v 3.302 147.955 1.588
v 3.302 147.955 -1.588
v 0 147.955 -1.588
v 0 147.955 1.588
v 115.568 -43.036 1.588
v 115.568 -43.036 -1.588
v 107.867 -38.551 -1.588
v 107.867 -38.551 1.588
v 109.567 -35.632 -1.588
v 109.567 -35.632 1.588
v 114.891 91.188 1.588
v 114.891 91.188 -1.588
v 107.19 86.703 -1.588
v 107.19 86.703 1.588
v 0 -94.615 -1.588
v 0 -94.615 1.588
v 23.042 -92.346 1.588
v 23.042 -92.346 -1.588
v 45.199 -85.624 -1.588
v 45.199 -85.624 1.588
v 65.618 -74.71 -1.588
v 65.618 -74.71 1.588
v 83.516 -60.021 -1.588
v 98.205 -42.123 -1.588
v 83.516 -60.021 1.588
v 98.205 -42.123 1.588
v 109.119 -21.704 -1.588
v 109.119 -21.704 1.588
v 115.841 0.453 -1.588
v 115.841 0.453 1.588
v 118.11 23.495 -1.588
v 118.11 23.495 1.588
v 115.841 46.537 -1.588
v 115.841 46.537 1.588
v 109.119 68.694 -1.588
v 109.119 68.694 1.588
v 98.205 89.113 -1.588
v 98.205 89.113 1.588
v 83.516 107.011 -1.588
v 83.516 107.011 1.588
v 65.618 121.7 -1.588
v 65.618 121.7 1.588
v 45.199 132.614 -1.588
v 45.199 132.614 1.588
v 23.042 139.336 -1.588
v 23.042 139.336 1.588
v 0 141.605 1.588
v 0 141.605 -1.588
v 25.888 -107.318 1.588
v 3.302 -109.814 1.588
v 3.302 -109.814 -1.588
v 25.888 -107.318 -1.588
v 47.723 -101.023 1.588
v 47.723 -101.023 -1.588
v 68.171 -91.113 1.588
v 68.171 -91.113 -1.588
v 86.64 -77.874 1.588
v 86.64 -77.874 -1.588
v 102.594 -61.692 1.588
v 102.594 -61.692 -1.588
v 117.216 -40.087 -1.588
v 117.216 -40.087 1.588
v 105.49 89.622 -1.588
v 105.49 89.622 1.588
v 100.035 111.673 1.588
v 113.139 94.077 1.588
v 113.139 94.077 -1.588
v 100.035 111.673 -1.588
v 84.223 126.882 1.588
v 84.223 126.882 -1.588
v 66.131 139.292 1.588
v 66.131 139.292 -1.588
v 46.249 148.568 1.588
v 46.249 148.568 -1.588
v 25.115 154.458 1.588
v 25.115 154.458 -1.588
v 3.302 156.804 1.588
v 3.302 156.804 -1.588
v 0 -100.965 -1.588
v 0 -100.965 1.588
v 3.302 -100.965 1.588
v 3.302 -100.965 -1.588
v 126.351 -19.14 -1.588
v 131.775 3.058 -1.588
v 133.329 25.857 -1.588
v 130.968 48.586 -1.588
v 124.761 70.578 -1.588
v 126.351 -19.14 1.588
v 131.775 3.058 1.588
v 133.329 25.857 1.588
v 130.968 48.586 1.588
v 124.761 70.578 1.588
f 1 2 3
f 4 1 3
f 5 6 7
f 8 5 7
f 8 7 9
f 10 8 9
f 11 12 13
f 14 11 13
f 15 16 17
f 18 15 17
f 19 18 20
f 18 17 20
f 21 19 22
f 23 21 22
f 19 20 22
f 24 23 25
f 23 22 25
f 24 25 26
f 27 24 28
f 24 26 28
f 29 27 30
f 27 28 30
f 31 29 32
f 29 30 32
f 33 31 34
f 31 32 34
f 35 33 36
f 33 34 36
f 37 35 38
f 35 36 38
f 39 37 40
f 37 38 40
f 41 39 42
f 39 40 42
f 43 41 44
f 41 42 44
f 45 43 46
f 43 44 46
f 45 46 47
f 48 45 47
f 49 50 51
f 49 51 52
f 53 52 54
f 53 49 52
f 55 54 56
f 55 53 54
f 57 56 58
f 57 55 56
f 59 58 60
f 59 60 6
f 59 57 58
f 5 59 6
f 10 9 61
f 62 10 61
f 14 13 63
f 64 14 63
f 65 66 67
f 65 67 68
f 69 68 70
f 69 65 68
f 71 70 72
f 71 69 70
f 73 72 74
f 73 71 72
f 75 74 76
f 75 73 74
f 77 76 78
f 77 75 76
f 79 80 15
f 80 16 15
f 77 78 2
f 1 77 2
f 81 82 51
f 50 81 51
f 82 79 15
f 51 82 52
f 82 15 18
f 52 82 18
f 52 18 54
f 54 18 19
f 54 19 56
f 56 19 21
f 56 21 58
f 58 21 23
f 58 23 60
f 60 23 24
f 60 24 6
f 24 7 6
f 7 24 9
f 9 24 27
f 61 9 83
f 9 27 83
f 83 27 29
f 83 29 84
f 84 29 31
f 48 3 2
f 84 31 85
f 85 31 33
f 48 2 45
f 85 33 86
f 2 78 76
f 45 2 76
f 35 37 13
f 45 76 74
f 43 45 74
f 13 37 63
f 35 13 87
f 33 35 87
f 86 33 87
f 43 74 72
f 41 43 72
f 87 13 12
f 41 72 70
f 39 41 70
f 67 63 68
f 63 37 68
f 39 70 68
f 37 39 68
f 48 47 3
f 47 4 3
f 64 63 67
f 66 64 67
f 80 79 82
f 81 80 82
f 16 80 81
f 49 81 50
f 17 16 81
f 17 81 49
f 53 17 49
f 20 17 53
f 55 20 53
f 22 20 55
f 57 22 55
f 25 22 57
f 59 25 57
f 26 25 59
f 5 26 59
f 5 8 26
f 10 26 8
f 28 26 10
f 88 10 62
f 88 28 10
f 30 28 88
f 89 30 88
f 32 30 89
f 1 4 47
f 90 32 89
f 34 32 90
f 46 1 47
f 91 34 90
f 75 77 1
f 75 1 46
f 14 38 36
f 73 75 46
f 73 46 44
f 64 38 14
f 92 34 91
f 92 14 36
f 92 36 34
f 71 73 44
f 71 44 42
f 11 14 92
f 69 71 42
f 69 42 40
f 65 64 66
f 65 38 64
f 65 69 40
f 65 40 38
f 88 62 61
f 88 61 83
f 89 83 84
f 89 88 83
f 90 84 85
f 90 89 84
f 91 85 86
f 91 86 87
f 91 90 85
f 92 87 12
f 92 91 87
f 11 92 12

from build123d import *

# Parameters (mm, degrees)
BOSS_EXTRUDE1_DEPTH = 1.5875
CUT_EXTRUDE1_DEPTH  = 3.175
FILLET1_R           = 8.89
SKETCH3_W           = 234.443386257
SKETCH3_H           = 422.563019086
CUT_EXTRUDE2_DEPTH  = 134.35
CUT_EXTRUDE3_DEPTH  = 4.175


with BuildPart() as part:
    # Sketch1 → Boss-Extrude1 (new body, symmetric)
    with BuildSketch(Plane.XY):
        with BuildLine():
            Line((-120.187952283, -34.272453), (-93.24718392, -61.213221363))
            Line((-93.24718392, -61.213221363), (-94.292689271, -70.797689271))
            ThreePointArc((-94.292689271, -70.797689271), (-77.124658044, -85.289234251), (-57.767453, -96.692952283))
            ThreePointArc((-57.767453, -96.692952283), (94.292689271, 117.787689271), (-120.187952283, -34.272453))
        make_face()
    extrude(amount=BOSS_EXTRUDE1_DEPTH, both=True)

    # Sketch2 → Cut-Extrude1 (cut)
    with BuildSketch(Plane.XY.offset(1.5875)):
        with BuildLine():
            Line((-77.304798152, -55.60299244), (-78.320318415, -64.912577861))
            ThreePointArc((-78.320318415, -64.912577861), (94.997930523, 93.675946819), (-107.51910025, -25.388690342))
            Line((-107.51910025, -25.388690342), (-77.304798152, -55.60299244))
        make_face()
    extrude(amount=-CUT_EXTRUDE1_DEPTH, mode=Mode.SUBTRACT)

    # Fillet1
    fillet1_edges = [part.edges().sort_by_distance(p)[0] for p in [
        (-77.304798152, -55.60299244, 0),
        (-107.51910025, -25.388690342, 0),
        (-78.320318415, -64.912577861, 0),
        (-93.24718392, -61.213221363, -0.79375),
        (-120.187952283, -34.272453, -0.79375),
        (-94.292689271, -70.797689271, -0.79375),
    ]]
    fillet(fillet1_edges, radius=FILLET1_R)

    # Sketch3 → Cut-Extrude2 (cut, through all)
    with BuildSketch(Plane(origin=(0, 0, 0), x_dir=(0, 0, -1), z_dir=(1, 0, 0))):
        with Locations((10.168628802, 16.433452221)):
            Rectangle(SKETCH3_W, SKETCH3_H)
    extrude(amount=-CUT_EXTRUDE2_DEPTH, mode=Mode.SUBTRACT)

    # Sketch4 → Cut-Extrude3 (cut, through all)
    with BuildSketch(Plane(origin=(0, 0, -1.5875), x_dir=(-1, 0, 0), z_dir=(0, 0, -1))):
        with BuildLine():
            Line((-3.302, 156.804111827), (-3.302, 147.955))
            Line((-3.302, 147.955), (0, 147.955))
            Line((0, 147.955), (0, 156.845))
            ThreePointArc((0, 156.845), (-1.651126573, 156.834777565), (-3.302, 156.804111827))
        make_face()
        with BuildLine():
            Line((-105.489605782, 89.621888205), (-113.138876948, 94.076987949))
            ThreePointArc((-113.138876948, 94.076987949), (-114.023976238, 92.638006465), (-114.890774539, 91.187927443))
            Line((-114.890774539, 91.187927443), (-107.18979641, 86.702712453))
            Line((-107.18979641, 86.702712453), (-105.489605782, 89.621888205))
        make_face()
        with BuildLine():
            Line((-109.566752285, -35.631551273), (-117.216023462, -40.086650998))
            ThreePointArc((-117.216023462, -40.086650998), (-116.401122895, -41.566517726), (-115.567539805, -43.035942))
            Line((-115.567539805, -43.035942), (-107.866561664, -38.550727029))
            Line((-107.866561664, -38.550727029), (-109.566752285, -35.631551273))
        make_face()
        with BuildLine():
            Line((-3.302, -100.965), (-3.302, -109.814111827))
            ThreePointArc((-3.302, -109.814111827), (-1.651126573, -109.844777565), (0, -109.855))
            Line((0, -109.855), (0, -100.965))
            Line((0, -100.965), (-3.302, -100.965))
        make_face()
    extrude(amount=-CUT_EXTRUDE3_DEPTH, mode=Mode.SUBTRACT)


solid = part.part
